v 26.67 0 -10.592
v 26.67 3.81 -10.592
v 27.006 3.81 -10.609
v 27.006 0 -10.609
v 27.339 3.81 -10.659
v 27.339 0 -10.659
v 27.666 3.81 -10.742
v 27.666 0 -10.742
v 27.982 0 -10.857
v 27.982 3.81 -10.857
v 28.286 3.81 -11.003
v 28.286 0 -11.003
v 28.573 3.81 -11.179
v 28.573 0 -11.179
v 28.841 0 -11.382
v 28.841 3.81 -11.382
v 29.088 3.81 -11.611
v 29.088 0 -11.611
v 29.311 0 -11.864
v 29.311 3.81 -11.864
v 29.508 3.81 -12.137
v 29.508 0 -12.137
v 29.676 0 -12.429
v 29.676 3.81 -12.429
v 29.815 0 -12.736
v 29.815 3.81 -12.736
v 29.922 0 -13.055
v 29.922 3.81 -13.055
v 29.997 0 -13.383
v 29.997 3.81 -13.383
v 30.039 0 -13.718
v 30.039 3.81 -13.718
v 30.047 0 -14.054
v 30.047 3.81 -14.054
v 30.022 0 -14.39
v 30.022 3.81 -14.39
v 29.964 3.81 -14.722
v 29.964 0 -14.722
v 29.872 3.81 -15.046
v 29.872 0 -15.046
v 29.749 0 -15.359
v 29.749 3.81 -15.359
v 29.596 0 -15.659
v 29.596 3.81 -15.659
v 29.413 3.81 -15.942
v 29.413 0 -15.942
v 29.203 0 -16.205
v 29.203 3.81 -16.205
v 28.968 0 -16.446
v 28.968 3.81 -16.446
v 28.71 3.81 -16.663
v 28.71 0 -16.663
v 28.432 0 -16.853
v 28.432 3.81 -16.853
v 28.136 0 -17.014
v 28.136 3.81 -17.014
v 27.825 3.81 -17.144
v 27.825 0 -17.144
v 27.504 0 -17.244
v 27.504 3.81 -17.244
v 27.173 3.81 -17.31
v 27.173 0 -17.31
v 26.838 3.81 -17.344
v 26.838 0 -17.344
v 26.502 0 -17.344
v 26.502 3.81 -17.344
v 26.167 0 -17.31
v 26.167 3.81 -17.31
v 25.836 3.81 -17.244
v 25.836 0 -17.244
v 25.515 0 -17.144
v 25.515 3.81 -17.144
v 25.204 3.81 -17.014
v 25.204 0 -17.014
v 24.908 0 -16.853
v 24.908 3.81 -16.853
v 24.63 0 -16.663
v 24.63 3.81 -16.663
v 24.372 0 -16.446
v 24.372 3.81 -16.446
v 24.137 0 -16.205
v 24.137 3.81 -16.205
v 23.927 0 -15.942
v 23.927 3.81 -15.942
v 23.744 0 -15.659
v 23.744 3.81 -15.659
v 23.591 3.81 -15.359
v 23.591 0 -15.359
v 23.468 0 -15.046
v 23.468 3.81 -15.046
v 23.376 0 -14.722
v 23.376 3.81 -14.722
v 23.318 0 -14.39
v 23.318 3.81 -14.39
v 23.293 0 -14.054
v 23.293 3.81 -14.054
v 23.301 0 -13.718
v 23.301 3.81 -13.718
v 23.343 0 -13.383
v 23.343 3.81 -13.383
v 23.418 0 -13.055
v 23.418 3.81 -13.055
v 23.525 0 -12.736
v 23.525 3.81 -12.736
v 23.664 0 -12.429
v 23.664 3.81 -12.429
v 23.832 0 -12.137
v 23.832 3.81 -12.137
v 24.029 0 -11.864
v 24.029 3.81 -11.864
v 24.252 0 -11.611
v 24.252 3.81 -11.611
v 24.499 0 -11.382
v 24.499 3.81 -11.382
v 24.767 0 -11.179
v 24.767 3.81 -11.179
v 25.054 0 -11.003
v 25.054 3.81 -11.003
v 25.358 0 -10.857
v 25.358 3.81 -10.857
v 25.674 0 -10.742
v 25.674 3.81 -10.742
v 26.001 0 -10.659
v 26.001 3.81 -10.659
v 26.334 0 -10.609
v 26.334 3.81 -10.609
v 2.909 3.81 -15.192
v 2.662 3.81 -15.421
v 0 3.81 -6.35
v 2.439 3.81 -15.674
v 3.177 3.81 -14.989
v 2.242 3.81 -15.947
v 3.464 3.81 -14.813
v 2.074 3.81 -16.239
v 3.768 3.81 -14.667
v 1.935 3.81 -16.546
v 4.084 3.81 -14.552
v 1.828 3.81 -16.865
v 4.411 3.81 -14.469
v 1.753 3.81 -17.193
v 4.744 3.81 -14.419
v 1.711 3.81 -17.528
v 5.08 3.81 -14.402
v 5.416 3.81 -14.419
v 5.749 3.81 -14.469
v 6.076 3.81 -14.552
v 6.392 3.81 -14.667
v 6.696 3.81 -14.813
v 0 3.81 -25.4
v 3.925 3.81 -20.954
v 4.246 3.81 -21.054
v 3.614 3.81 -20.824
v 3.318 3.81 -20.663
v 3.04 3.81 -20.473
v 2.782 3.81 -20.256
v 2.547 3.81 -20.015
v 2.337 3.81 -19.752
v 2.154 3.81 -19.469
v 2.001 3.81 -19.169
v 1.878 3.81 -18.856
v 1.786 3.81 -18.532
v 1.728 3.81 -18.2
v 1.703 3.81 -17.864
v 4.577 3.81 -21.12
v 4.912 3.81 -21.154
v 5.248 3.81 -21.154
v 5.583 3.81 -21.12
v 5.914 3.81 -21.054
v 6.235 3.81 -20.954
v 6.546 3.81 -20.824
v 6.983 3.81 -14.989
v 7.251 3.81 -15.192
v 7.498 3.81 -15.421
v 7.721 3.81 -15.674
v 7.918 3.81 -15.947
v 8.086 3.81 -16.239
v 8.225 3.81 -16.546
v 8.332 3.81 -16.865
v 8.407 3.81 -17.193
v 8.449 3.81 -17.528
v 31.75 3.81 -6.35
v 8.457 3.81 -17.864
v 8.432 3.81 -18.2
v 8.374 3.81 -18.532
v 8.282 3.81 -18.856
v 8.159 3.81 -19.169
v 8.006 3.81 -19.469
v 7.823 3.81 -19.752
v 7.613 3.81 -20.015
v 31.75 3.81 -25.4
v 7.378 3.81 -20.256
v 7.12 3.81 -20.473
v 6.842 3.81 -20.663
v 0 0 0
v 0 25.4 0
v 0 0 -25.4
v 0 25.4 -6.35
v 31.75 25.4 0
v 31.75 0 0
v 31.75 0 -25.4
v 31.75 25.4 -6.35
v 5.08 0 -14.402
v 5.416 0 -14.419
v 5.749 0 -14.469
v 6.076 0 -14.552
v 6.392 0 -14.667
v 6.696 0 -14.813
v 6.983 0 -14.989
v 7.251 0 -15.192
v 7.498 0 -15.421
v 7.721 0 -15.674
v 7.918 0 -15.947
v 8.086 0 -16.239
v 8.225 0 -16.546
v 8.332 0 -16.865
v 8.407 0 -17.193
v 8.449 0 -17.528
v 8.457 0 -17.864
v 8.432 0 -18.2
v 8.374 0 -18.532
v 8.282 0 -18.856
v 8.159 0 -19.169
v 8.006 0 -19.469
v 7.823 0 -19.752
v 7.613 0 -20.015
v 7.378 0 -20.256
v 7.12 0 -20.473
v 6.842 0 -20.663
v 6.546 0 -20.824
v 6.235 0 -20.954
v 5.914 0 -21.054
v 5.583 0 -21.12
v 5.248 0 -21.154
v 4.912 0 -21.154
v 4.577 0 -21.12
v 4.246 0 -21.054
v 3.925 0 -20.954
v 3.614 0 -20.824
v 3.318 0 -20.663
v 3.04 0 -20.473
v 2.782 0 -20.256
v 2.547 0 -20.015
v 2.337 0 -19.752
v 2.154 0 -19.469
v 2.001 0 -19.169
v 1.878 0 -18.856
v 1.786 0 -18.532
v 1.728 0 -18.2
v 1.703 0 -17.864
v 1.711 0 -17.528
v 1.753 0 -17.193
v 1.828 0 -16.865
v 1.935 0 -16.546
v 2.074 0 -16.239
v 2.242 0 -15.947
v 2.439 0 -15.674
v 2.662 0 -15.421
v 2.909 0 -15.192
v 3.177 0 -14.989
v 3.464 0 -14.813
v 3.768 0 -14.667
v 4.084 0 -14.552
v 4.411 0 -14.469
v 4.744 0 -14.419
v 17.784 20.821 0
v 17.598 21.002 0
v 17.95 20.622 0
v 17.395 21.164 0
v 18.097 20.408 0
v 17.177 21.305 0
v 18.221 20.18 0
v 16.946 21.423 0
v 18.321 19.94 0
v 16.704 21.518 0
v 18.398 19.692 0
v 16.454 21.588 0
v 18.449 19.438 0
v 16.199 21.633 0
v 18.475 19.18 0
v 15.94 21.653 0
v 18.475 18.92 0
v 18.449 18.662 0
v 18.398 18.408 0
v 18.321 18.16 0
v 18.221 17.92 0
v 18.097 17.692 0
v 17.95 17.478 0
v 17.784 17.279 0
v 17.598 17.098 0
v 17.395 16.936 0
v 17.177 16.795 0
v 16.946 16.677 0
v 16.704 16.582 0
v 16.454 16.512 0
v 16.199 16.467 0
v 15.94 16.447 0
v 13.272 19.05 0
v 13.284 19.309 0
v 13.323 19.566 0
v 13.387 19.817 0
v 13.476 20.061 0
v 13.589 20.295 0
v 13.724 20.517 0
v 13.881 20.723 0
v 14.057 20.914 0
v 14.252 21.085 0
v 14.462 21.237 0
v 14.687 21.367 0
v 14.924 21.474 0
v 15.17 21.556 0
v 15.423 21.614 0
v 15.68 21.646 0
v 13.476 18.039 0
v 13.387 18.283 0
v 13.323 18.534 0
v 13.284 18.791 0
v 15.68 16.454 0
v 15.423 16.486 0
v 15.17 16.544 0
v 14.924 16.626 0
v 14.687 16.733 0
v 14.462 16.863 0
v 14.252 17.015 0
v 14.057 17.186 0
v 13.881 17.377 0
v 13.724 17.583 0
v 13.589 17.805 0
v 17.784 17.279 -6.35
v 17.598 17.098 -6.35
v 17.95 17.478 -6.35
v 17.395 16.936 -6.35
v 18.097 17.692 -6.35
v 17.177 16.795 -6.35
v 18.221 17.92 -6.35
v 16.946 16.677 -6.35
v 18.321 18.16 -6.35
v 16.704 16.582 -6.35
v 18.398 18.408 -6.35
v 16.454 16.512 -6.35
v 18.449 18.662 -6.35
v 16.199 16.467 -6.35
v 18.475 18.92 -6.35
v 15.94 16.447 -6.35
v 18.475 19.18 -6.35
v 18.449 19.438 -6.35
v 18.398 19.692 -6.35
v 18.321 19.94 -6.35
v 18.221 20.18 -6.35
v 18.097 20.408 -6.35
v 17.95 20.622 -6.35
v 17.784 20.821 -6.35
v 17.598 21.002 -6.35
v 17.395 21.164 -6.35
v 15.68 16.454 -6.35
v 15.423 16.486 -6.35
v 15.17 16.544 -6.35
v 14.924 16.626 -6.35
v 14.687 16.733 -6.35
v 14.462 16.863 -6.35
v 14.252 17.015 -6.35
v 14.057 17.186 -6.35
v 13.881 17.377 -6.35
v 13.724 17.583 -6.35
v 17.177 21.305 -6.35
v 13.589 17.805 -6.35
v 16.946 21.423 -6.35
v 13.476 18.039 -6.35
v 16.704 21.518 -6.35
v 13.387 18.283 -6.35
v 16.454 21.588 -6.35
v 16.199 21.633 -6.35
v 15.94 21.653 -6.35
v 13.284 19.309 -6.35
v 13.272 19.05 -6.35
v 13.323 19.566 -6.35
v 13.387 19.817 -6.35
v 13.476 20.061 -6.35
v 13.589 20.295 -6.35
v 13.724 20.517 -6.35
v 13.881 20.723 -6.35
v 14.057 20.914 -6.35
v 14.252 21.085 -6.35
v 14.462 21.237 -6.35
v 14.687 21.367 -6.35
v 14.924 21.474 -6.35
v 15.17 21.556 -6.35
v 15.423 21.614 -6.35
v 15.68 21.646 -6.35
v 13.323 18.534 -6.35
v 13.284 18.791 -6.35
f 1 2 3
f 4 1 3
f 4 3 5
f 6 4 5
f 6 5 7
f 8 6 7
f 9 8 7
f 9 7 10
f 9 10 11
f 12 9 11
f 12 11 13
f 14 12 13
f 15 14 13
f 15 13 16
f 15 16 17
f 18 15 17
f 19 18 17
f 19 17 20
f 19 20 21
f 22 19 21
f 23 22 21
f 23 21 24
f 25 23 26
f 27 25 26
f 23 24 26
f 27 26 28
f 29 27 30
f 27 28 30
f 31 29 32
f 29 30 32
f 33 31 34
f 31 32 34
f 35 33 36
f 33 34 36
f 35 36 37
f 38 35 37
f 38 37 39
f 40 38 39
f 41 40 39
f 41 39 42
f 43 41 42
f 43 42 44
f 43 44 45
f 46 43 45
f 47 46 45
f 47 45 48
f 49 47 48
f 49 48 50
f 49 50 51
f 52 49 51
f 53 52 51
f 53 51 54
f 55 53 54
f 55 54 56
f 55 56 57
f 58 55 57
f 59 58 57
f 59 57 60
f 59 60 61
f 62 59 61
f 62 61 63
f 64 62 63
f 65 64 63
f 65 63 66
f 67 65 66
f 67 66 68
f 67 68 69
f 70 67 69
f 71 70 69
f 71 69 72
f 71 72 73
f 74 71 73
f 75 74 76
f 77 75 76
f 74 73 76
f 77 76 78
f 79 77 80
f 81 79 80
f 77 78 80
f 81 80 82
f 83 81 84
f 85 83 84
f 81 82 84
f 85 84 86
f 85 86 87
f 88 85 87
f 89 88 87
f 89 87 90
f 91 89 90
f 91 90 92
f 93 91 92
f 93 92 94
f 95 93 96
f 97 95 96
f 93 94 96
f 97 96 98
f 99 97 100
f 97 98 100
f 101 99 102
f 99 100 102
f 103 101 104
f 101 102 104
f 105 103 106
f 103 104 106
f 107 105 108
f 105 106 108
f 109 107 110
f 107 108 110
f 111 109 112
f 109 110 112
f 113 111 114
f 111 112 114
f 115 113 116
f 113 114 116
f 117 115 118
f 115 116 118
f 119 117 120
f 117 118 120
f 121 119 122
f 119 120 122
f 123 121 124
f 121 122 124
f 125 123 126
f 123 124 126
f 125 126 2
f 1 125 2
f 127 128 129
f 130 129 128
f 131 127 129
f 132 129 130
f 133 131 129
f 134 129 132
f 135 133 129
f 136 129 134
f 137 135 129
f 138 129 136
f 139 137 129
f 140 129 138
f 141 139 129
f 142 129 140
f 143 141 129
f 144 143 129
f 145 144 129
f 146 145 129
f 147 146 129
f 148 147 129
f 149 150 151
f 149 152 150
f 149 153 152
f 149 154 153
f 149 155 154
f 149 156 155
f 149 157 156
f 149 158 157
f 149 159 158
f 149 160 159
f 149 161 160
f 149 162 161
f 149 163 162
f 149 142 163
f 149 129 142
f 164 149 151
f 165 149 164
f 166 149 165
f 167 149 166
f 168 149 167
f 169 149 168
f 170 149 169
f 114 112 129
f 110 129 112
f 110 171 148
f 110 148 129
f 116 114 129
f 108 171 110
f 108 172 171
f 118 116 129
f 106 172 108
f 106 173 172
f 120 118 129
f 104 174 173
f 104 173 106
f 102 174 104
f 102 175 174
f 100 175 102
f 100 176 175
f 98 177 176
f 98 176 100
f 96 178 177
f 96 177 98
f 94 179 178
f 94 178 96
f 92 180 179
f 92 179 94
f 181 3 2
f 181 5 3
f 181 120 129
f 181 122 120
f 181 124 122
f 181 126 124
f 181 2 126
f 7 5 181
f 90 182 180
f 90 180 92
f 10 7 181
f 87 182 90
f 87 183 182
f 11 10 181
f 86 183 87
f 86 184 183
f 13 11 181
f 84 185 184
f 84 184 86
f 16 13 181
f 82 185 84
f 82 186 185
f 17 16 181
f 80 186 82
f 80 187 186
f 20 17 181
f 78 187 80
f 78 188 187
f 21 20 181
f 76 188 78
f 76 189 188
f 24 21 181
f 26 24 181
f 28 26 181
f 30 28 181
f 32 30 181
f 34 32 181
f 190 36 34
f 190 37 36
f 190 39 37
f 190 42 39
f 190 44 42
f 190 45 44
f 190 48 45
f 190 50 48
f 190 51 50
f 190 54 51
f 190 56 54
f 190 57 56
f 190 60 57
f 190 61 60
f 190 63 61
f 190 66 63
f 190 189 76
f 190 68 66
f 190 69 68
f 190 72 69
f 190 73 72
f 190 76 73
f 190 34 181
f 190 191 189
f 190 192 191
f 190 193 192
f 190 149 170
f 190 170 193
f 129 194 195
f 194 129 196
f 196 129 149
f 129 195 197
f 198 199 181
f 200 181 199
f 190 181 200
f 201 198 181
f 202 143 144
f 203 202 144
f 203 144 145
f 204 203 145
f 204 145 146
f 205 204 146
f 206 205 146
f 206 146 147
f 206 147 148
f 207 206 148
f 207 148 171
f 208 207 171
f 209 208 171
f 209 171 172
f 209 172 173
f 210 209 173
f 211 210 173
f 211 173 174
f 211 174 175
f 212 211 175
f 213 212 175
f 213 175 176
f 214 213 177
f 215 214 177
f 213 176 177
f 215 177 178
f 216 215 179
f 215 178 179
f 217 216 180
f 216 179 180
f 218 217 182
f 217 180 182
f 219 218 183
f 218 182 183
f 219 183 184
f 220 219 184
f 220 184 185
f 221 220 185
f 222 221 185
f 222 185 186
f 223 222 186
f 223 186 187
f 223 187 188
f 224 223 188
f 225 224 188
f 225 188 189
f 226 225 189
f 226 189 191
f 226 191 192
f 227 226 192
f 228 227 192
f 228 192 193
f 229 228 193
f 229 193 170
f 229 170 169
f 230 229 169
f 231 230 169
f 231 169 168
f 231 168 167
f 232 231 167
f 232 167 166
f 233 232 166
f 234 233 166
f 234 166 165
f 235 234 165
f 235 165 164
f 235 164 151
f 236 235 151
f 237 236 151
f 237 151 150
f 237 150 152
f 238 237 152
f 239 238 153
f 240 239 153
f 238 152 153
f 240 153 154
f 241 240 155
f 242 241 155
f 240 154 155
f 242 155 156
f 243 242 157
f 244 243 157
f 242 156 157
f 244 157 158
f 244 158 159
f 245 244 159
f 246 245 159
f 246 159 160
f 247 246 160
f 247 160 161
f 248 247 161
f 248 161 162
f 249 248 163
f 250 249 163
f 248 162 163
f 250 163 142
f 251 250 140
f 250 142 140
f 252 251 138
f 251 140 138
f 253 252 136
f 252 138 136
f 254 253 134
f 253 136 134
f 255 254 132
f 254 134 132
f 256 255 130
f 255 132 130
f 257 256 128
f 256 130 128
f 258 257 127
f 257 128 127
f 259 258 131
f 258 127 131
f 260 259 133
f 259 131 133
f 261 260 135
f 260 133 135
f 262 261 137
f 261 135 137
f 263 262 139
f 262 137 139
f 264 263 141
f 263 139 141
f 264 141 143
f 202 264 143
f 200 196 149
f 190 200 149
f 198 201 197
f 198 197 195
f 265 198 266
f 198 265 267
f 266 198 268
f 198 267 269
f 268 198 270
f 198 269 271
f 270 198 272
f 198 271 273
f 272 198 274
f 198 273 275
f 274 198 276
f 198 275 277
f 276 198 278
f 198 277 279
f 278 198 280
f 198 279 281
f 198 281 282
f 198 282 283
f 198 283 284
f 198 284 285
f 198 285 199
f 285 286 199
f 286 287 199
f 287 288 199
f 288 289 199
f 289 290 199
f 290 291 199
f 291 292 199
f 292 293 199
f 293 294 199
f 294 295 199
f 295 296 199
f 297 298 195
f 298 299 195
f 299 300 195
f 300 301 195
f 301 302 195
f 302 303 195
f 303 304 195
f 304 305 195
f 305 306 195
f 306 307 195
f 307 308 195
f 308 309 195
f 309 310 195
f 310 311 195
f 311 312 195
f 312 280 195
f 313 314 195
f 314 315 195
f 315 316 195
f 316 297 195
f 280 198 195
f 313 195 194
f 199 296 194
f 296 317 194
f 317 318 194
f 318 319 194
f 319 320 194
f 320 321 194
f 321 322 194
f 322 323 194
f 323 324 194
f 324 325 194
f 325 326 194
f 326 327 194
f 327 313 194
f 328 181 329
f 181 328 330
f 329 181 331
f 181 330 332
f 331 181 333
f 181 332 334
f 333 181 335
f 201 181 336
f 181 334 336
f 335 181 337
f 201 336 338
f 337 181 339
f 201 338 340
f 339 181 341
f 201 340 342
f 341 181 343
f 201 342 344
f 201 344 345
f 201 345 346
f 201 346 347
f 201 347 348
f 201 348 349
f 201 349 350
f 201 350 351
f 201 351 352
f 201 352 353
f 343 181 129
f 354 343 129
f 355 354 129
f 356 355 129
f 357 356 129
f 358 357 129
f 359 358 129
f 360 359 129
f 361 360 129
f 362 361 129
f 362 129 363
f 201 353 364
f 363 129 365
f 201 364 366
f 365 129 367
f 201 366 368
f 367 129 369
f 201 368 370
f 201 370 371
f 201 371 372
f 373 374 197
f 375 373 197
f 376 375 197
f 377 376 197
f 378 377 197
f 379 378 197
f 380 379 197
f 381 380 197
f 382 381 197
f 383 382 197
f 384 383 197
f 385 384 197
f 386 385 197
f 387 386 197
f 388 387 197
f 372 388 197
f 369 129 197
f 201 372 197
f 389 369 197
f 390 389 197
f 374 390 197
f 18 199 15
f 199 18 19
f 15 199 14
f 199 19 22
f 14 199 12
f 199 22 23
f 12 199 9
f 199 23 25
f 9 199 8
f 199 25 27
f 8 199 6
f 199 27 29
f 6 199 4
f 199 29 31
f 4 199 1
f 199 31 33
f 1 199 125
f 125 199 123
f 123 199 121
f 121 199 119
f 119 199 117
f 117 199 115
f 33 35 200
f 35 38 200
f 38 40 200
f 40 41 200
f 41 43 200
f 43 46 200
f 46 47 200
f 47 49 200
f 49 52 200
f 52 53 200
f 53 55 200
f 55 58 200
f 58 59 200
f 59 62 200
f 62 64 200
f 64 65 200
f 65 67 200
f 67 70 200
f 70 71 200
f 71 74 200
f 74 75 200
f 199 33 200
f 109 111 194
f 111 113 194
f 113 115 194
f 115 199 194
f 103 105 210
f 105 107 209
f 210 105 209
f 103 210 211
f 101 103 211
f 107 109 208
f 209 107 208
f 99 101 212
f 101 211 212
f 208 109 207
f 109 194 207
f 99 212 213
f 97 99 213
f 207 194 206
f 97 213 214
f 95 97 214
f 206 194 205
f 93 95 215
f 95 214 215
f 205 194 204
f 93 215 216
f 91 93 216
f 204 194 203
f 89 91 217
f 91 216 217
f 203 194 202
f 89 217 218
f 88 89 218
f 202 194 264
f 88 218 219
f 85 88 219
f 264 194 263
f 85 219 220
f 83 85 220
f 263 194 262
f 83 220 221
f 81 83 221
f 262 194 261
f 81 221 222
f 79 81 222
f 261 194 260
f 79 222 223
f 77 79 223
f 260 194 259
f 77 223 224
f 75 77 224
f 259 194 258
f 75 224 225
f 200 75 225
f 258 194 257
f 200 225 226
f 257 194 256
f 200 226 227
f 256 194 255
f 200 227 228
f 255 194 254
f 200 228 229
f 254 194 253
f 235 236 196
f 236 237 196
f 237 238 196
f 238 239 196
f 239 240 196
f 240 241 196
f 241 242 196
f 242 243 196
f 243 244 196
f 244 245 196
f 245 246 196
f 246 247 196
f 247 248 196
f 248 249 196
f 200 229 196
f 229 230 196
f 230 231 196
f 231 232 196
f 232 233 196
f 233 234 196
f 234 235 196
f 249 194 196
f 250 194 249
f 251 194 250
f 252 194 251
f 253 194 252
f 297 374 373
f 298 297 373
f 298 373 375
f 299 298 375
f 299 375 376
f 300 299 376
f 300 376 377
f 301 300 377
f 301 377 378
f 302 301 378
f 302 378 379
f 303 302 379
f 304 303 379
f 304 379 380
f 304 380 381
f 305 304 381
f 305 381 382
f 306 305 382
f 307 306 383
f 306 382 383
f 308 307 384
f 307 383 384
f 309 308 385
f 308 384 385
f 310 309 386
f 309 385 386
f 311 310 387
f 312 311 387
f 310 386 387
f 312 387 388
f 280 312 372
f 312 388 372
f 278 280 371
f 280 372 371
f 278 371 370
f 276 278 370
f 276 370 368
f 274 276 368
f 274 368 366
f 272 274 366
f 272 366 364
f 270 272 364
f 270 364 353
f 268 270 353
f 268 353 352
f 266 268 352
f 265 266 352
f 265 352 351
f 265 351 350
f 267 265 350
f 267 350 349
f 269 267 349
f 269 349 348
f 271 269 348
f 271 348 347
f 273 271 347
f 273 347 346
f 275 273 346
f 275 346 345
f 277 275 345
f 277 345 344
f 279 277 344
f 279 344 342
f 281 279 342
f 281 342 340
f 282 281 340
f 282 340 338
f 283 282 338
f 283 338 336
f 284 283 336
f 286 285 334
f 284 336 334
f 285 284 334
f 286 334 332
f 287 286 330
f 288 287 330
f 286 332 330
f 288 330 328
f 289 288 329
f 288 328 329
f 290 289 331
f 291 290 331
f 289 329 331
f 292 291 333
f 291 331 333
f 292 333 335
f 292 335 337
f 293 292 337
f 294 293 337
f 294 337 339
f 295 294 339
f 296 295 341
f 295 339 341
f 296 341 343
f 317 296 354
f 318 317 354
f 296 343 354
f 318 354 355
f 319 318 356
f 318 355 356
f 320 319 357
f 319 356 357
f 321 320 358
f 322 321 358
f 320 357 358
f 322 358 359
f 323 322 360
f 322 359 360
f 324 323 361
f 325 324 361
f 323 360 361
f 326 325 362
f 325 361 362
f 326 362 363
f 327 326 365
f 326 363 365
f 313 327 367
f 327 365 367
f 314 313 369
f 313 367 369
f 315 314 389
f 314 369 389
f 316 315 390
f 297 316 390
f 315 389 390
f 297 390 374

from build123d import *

# Parameters (mm, degrees)
BOSS_EXTRUDE1_DEPTH = 31.75
SKETCH3_R           = 2.6035
CUT_EXTRUDE1_DEPTH  = 45.901280605
SKETCH4_R           = 3.3782
CUT_EXTRUDE2_DEPTH  = 45.901280605
SKETCH5_W           = 31.75
SKETCH5_H           = 19.05
CUT_EXTRUDE3_DEPTH  = 2.54


with BuildPart() as part:
    # Sketch2 → Boss-Extrude1 (new body)
    with BuildSketch(Plane(origin=(0, 0, 0), x_dir=(0, 0, -1), z_dir=(1, 0, 0))):
        Polygon((0, 0), (25.4, 0), (25.4, 6.35), (6.35, 6.35), (6.35, 25.4), (0, 25.4), align=None)
    extrude(amount=BOSS_EXTRUDE1_DEPTH)

    # Sketch3 → Cut-Extrude1 (cut, through all)
    with BuildSketch(Plane(origin=(0, 0, -6.35), x_dir=(-1, 0, 0), z_dir=(0, 0, -1))):
        with Locations((-15.875, 19.05)):
            Circle(SKETCH3_R)
    extrude(amount=-CUT_EXTRUDE1_DEPTH, mode=Mode.SUBTRACT)

    # Sketch4 → Cut-Extrude2 (cut, through all)
    with BuildSketch(Plane(origin=(0, 6.35, 0), x_dir=(1, 0, 0), z_dir=(0, 1, 0))):
        with Locations(Location((5.08, 17.78, 0), (0, 0, 270))):
            Circle(SKETCH4_R)
        with Locations(Location((26.67, 13.97, 0), (0, 0, 270))):
            Circle(SKETCH4_R)
    extrude(amount=-CUT_EXTRUDE2_DEPTH, mode=Mode.SUBTRACT)

    # Sketch5 → Cut-Extrude3 (cut)
    with BuildSketch(Plane(origin=(0, 6.35, 0), x_dir=(1, 0, 0), z_dir=(0, 1, 0))):
        with Locations((15.875, 15.875)):
            Rectangle(SKETCH5_W, SKETCH5_H)
    extrude(amount=-CUT_EXTRUDE3_DEPTH, mode=Mode.SUBTRACT)


solid = part.part
